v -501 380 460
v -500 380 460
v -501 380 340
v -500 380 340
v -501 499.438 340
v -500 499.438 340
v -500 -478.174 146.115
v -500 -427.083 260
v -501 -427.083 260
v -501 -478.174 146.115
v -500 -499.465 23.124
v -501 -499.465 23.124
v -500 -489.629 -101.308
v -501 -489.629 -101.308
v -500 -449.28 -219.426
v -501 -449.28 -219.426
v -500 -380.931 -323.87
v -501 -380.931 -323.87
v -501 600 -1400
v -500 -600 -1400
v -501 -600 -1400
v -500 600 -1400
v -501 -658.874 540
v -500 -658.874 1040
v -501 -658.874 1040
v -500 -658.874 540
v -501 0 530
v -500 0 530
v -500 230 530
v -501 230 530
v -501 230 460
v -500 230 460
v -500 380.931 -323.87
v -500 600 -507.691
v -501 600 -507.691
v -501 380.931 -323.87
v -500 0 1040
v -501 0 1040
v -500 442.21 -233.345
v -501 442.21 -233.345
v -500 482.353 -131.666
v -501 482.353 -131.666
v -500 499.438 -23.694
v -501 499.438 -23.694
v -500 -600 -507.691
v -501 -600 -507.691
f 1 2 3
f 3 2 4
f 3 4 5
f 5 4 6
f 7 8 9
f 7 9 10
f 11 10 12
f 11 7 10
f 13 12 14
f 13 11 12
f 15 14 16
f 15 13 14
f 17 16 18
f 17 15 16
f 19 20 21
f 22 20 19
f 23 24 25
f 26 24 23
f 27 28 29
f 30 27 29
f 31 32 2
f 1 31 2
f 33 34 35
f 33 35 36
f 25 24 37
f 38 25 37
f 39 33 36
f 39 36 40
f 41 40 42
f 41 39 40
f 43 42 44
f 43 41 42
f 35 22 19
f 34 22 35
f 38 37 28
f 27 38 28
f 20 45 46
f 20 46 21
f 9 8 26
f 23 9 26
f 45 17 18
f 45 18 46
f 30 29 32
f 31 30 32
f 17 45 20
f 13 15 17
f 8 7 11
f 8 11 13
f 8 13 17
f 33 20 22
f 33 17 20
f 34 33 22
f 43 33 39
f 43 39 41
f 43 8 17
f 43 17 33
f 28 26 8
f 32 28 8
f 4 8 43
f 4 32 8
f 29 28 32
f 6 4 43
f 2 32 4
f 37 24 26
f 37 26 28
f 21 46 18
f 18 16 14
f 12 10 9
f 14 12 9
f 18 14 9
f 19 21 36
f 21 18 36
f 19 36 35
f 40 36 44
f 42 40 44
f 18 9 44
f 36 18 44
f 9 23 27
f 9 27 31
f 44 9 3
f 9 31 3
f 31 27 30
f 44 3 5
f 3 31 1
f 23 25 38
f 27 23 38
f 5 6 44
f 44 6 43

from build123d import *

# Parameters (mm, degrees)
PAD_DEPTH = 1


with BuildPart() as part:
    # Sketch → Pad (new body)
    with BuildSketch(Plane.YZ.offset(-500)):
        with BuildLine():
            ThreePointArc((-427.08313, 260), (-498.445232, -39.399887), (-380.9308, -323.869921))
            Line((-380.9308, -323.869921), (-600, -507.690796))
            Line((-600, -507.690796), (-600, -1400))
            Line((-600, -1400), (600, -1400))
            Line((600, -1400), (600, -507.690796))
            Line((600, -507.690796), (380.9308, -323.869921))
            ThreePointArc((380.9308, -323.869921), (465.068634, -183.606008), (499.438281, -23.693945))
            Line((499.438281, 340), (499.438281, -23.693945))
            Line((380, 340), (499.438281, 340))
            Line((380, 460), (380, 340))
            Line((230, 460), (380, 460))
            Line((230, 530), (230, 460))
            Line((0, 530), (230, 530))
            Line((0, 1040), (0, 530))
            Line((-658.874021, 1040), (0, 1040))
            Line((-658.874021, 1040), (-658.874021, 540))
            Line((-427.08313, 260), (-658.874021, 540))
        make_face()
    extrude(amount=-PAD_DEPTH)


solid = part.part
